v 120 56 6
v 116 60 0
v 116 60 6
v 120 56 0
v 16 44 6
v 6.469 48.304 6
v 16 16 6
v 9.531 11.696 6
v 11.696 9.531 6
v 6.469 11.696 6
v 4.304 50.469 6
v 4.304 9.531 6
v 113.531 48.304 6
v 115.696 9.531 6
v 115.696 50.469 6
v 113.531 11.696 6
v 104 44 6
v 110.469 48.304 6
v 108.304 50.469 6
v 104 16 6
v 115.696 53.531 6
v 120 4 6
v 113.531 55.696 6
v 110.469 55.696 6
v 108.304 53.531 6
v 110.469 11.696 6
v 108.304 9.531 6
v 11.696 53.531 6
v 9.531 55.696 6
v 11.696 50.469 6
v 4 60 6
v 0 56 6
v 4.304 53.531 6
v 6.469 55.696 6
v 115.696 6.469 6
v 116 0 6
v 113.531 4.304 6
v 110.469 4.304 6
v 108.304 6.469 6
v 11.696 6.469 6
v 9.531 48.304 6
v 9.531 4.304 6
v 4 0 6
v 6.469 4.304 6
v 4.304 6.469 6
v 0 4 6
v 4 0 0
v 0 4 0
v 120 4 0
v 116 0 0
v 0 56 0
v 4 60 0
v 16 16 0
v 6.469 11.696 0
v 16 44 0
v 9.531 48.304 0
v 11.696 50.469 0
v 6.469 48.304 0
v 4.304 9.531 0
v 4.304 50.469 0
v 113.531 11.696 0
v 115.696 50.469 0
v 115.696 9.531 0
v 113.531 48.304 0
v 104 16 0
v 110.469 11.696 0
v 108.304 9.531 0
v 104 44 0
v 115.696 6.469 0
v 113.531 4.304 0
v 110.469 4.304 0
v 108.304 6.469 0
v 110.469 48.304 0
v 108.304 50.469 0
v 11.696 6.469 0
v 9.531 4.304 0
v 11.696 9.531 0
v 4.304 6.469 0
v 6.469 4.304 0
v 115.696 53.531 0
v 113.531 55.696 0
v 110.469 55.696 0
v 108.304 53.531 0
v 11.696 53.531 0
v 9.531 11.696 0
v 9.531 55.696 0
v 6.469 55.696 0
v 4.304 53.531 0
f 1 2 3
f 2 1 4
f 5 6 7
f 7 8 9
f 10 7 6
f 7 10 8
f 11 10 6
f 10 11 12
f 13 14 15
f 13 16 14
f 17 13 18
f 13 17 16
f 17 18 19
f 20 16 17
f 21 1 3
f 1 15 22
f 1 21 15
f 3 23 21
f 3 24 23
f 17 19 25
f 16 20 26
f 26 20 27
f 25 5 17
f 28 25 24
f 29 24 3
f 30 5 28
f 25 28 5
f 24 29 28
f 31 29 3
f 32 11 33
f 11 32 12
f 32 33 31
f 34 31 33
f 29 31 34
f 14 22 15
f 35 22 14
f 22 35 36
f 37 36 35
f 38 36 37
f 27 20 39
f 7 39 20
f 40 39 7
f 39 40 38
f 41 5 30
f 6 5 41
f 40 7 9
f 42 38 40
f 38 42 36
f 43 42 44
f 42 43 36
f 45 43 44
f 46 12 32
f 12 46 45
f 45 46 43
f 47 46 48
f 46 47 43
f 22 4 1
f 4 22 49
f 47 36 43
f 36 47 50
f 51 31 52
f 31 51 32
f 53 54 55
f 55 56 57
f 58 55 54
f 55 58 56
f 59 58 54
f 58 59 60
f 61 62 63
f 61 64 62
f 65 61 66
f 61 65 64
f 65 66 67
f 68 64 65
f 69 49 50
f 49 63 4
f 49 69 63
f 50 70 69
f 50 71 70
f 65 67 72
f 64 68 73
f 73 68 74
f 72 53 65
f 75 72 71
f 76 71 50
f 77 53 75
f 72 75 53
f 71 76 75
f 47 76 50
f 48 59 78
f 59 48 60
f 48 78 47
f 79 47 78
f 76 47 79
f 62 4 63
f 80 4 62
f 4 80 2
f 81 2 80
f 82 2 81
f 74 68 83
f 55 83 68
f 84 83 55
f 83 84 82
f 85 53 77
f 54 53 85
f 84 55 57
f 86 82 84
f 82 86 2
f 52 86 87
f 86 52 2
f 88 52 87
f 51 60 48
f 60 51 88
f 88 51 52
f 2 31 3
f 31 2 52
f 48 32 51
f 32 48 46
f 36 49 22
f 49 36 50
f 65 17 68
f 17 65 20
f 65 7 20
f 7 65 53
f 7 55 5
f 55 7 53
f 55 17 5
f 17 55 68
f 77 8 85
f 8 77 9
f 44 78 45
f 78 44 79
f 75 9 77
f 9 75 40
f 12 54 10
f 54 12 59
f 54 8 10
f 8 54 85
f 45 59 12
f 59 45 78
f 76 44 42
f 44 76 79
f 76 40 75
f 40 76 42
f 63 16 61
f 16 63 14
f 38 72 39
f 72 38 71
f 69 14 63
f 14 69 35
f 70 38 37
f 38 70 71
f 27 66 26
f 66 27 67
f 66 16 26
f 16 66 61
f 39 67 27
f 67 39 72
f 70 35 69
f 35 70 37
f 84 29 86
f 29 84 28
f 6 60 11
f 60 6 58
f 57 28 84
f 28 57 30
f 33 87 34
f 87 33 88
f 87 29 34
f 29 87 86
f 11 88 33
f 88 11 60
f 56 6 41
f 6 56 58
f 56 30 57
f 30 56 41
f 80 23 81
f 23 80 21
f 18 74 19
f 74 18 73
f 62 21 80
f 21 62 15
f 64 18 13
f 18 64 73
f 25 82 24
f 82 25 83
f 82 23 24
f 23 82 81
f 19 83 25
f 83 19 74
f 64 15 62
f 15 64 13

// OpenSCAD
$fn = 32;

// ----------------------------------------------------------------------
// Frame plate: 120 x 60 frame, 16 mm rails
// ----------------------------------------------------------------------

// --- parameters (mm) ---
plate_l = 120;            // plate length, X
plate_w = 60;             // plate width, Y
plate_t = 6;              // plate thickness, Z (extrusion height)
corner_c = 4;             // corner chamfer
frame_bar = 16;           // frame rail width
bolt_r = 4;               // corner bolt window radius
bolt_inset = 8;           // bolt centre inset from the edges

win_l = plate_l - 2 * frame_bar;  // window length
win_w = plate_w - 2 * frame_bar;  // window width
bolt_d = 2 * bolt_r;  // corner hole diameter

profile = [[4, 0], [116, 0], [120, 4], [120, 56], [116, 60], [4, 60], [0, 56], [0, 4]];  // primary outline, 8 points, counter clockwise
void_1 = [[16, 16], [104, 16], [104, 44], [16, 44]];  // the window, 4 points
void_2 = [[11.696, 9.531], [9.531, 11.696], [6.469, 11.696], [4.304, 9.531], [4.304, 6.469], [6.469, 4.304], [9.531, 4.304], [11.696, 6.469]];  // corner bolt window, 8 points
void_3 = [[115.696, 9.531], [113.531, 11.696], [110.469, 11.696], [108.304, 9.531], [108.304, 6.469], [110.469, 4.304], [113.531, 4.304], [115.696, 6.469]];  // corner bolt window, 8 points
void_4 = [[11.696, 53.531], [9.531, 55.696], [6.469, 55.696], [4.304, 53.531], [4.304, 50.469], [6.469, 48.304], [9.531, 48.304], [11.696, 50.469]];  // corner bolt window, 8 points
void_5 = [[115.696, 53.531], [113.531, 55.696], [110.469, 55.696], [108.304, 53.531], [108.304, 50.469], [110.469, 48.304], [113.531, 48.304], [115.696, 50.469]];  // corner bolt window, 8 points

// --- the one profile operation ---
difference() {
  linear_extrude(height = plate_t) polygon(points = profile);
  translate([0, 0, -1])
    linear_extrude(height = plate_t + 2) polygon(points = void_1);
  translate([0, 0, -1])
    linear_extrude(height = plate_t + 2) polygon(points = void_2);
  translate([0, 0, -1])
    linear_extrude(height = plate_t + 2) polygon(points = void_3);
  translate([0, 0, -1])
    linear_extrude(height = plate_t + 2) polygon(points = void_4);
  translate([0, 0, -1])
    linear_extrude(height = plate_t + 2) polygon(points = void_5);
}
